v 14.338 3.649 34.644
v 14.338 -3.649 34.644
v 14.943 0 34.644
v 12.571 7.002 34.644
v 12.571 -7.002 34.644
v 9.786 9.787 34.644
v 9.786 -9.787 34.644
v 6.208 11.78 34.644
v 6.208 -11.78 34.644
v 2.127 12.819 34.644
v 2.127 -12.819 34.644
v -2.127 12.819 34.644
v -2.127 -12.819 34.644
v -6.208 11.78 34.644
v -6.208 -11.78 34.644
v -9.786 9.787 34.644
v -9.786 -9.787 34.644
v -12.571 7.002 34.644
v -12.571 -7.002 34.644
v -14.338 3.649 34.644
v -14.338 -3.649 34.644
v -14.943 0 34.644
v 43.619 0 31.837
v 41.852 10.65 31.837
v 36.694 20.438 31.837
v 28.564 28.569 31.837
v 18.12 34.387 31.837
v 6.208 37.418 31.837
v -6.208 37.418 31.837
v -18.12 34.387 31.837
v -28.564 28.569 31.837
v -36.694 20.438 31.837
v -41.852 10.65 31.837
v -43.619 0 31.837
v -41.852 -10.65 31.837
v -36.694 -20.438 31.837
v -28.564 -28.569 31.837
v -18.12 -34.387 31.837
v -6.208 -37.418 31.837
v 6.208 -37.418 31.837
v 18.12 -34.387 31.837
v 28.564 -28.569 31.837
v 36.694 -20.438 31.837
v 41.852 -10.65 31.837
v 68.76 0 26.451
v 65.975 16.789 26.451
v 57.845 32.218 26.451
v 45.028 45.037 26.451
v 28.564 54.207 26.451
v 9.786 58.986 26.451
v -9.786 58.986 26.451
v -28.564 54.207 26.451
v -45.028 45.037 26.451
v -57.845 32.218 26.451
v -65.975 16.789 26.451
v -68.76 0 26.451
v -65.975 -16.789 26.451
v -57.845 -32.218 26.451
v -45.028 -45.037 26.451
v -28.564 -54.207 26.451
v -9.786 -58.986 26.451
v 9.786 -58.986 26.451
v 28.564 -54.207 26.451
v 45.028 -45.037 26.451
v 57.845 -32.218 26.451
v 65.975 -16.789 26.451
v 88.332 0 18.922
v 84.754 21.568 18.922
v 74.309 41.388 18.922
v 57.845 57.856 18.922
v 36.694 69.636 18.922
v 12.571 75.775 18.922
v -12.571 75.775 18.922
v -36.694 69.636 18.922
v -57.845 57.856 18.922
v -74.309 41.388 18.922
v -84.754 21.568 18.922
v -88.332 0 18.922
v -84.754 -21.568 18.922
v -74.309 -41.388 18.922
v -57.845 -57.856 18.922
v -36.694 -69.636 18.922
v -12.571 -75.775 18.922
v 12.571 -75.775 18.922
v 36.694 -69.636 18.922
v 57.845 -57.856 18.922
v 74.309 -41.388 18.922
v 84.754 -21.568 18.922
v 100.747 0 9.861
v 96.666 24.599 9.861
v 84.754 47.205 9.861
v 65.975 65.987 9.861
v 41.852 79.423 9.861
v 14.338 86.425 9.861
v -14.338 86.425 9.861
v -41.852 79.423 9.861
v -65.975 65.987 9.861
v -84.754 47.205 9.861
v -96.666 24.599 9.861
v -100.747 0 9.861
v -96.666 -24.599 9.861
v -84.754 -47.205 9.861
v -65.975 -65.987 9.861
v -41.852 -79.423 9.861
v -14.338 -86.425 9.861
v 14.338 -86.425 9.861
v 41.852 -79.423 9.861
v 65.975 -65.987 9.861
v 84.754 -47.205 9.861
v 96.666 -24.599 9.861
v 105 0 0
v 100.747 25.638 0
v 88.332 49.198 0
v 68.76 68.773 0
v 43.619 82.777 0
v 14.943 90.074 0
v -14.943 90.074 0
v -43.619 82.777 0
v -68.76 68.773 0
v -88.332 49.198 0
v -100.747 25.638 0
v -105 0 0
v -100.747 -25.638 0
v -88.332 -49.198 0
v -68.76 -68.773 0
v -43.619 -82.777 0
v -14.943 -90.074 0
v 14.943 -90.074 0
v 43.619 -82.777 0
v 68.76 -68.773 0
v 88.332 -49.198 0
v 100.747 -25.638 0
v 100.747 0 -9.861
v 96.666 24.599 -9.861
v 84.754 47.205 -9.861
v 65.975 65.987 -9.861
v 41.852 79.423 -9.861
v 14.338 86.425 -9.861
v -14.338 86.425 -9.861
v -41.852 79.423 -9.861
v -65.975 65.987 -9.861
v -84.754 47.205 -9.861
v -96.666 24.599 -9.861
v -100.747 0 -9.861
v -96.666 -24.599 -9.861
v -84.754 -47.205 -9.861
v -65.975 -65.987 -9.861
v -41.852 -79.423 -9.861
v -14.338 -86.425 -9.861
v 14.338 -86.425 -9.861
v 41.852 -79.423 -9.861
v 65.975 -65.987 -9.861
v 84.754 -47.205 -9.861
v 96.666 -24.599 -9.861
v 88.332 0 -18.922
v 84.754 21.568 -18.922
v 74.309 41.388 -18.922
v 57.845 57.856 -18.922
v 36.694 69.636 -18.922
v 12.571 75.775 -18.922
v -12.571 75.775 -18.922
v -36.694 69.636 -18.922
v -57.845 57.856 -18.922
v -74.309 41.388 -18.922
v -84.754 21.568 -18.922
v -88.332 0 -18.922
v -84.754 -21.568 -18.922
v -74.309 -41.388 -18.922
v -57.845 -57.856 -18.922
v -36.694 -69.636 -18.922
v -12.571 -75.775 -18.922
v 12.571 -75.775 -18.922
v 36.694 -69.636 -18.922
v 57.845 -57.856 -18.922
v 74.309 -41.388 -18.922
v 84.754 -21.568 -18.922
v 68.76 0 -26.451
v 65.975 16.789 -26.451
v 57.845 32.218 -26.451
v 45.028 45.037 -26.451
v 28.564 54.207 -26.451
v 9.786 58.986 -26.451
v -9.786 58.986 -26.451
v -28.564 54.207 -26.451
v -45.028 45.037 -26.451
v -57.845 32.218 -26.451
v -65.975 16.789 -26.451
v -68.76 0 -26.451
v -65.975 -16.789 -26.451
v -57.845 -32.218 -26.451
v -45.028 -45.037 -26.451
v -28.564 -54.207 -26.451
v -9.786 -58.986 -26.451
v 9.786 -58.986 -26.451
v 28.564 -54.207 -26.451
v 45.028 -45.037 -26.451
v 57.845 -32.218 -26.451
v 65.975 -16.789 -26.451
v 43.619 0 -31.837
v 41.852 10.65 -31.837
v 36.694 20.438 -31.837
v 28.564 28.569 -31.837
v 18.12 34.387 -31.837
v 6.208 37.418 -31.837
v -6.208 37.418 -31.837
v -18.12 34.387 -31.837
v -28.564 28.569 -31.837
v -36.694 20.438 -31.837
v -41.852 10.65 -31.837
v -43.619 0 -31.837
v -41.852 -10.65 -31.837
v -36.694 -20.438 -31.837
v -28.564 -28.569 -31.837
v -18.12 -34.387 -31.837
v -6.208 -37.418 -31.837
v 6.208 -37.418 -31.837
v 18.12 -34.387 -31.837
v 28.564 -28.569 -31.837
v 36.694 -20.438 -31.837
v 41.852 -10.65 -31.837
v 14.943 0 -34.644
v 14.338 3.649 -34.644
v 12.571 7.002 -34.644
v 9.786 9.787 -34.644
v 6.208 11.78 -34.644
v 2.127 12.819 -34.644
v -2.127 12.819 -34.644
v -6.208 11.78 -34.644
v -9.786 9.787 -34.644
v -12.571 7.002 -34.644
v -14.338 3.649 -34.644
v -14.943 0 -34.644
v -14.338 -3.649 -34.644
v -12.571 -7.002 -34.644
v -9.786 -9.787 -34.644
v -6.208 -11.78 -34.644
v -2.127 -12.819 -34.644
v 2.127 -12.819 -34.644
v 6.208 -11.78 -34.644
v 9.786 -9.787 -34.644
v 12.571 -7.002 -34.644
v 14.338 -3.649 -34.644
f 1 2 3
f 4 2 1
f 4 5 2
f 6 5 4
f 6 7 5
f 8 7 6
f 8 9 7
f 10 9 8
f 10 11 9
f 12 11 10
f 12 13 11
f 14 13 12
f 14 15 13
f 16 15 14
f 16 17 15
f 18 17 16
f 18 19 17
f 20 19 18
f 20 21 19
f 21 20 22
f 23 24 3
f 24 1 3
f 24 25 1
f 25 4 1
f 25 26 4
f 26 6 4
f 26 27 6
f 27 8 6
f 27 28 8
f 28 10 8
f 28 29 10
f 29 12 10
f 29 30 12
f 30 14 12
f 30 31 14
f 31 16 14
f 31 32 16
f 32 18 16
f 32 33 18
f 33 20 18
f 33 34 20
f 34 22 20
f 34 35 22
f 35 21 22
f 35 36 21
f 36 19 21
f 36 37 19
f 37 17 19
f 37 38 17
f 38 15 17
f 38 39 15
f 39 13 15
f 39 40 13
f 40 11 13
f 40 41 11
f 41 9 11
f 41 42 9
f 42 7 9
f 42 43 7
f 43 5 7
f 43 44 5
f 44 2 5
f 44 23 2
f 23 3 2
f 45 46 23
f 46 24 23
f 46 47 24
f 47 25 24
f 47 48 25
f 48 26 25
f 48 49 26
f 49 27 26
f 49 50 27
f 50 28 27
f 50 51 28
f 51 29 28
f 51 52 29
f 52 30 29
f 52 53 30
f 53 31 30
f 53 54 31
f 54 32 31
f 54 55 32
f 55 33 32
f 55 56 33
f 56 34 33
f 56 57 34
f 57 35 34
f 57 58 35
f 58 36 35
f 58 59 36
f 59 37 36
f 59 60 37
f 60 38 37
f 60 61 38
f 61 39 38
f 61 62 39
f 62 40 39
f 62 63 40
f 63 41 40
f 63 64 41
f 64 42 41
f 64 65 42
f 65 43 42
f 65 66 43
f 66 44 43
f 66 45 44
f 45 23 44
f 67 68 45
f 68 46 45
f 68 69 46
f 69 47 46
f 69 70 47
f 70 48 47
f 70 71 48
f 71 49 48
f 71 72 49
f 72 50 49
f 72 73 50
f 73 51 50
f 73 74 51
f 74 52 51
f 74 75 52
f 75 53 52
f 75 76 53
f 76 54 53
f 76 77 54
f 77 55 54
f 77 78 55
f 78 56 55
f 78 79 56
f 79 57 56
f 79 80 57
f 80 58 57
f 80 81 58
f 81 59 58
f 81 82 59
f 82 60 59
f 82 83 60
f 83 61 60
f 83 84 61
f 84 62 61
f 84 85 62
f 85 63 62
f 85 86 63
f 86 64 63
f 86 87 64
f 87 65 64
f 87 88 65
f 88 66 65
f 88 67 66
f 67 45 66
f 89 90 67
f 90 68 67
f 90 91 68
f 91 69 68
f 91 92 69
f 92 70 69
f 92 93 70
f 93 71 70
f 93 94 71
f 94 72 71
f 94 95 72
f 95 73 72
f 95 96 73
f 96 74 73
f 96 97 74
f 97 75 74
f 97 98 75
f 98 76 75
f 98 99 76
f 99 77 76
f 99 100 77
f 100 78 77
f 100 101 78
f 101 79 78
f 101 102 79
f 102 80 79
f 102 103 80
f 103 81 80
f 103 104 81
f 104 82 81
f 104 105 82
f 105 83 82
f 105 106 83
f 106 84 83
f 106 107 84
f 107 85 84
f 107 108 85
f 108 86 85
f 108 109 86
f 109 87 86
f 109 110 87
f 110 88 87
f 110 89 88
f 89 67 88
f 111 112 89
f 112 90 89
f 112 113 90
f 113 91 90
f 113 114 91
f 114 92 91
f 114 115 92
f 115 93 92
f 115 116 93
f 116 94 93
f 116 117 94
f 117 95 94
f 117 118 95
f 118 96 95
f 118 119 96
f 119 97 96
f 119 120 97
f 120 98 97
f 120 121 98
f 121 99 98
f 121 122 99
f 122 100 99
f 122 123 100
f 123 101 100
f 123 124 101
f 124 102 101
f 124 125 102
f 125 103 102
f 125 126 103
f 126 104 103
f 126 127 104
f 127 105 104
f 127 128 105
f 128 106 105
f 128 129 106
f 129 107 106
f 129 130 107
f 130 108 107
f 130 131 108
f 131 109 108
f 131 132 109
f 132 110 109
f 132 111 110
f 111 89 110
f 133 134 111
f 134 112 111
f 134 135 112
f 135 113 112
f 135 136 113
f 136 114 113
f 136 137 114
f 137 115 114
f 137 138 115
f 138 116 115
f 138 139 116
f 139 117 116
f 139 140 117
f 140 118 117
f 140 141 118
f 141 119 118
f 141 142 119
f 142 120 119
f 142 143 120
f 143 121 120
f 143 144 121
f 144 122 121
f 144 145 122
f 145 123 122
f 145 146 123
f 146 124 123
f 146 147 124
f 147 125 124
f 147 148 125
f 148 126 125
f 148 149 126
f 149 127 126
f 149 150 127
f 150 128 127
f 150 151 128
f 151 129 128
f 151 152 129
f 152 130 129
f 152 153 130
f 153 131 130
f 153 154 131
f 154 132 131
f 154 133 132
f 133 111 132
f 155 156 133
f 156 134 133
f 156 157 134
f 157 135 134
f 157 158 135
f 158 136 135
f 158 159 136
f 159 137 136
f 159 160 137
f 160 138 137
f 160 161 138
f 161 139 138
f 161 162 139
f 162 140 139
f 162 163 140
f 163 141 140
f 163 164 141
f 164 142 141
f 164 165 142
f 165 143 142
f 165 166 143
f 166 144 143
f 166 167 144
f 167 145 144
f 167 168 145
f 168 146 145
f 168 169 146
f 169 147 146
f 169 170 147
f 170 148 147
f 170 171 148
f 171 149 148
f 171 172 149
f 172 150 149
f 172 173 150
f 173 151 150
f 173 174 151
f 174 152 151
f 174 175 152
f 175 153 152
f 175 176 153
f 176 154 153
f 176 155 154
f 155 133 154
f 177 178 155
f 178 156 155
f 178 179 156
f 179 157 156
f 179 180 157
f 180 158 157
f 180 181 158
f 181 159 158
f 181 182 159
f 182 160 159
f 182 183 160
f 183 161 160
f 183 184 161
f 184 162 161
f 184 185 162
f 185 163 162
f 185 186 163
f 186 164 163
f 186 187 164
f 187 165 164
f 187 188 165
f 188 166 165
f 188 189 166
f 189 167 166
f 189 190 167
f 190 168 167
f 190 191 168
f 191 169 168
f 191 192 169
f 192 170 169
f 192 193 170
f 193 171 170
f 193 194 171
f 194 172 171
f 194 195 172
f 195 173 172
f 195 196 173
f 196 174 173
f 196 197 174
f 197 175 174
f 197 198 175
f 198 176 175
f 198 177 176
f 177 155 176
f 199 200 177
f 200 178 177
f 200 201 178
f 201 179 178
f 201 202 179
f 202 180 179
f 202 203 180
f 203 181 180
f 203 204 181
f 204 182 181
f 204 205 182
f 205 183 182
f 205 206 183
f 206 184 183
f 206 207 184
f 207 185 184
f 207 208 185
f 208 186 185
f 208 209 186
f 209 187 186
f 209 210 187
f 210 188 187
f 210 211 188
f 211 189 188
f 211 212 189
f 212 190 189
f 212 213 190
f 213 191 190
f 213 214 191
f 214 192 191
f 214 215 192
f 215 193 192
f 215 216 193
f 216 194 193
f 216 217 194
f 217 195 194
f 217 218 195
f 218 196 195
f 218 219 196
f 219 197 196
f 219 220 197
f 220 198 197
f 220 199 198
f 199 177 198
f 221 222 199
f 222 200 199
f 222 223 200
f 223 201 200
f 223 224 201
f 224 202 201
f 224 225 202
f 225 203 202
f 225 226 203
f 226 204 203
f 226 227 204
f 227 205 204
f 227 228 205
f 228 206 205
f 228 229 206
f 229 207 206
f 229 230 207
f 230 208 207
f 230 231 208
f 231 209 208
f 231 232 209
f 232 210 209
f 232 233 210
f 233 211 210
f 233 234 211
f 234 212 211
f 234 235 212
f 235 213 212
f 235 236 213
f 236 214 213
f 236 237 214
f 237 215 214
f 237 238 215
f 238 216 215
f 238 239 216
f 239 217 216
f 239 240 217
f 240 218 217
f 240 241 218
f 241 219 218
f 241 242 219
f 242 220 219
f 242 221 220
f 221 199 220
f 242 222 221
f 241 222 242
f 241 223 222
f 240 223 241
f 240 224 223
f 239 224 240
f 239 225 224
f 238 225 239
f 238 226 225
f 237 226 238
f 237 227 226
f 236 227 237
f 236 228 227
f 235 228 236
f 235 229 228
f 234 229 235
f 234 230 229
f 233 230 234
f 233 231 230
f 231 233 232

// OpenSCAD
// Generated by SolidPython 1.0.1 on 2020-07-29 00:46:52


scale(v = [15, 13, 5]) {
	sphere(r = 7);
}
/***********************************************
*********      SolidPython code:      **********
************************************************
 
# import packages: SolidPython
from solid import *
from solid.utils import *
from itertools import chain, combinations, permutations


class Resize:

    def __init__(self, scad_file):
        self.scad_file = scad_file
        #self.scad_file = import_scad(scad_file)
        # cone/cylinder param:
        self.r1 = 0
        self.r2 = 0
        self.h = 0
        # rectangular prism param:
        self.w = 0
        self.l = 0
        # ellipse param:
        self.r = 0

    # import OpenScad code (file name corresponds to shape)


    # classify shape + parameters
    def assign(self, param1, param2, param3):
        if self.scad_file == 'cone.scad':
            self.r1 = param1
            self.r2 = param2
            self.h = param3
        elif self.scad_file == 'cylinder.scad':
            self.r1 = param1
            self.r2 = param2
            self.h = param3
        elif self.scad_file == 'rectangularPrism.scad':
            self.h = param1
            self.l = param2
            self.w = param3
        else:
            self.r = param1
            self.h = param2

    # resize parameters
    def iterate(self):
        x = range(3, 20, 2)
        i = 1
        if self.scad_file == 'cone.scad':
            tempList = list(permutations(x, 2))
            for temp in tempList:
                param1 = temp[0]
                param2 = temp[1]
                filepath = 'produced_scad_files/' + 'cone' + str(param1) + '_' + str(param2) + '_' + '.scad'
                scad_render_to_file(cylinder(h=param1, r1=param2, r2=0), filepath)

        elif self.scad_file == 'cylinder.scad':
            tempList = list(permutations(x, 3))
            for temp in tempList:
                param1 = temp[0]
                param2 = temp[1]
                filepath = 'produced_scad_files/' + 'cylinder' + str(param1) + '_' + str(param2) + '_' + '.scad'
                scad_render_to_file(cylinder(h=param1, r1=param2, r2=param2), filepath)

        elif self.scad_file == 'rectangularPrism.scad':
            tempList = list(permutations(x, 3))
            for temp in tempList:
                param1 = temp[0]
                param2 = temp[1]
                param3 = temp[2]
                filepath = 'produced_scad_files/' + 'rectangularPrism' + str(param1) + '_' + str(param2) + '_' + str(
                    param3) + '.scad'
                scad_render_to_file(cube(size=(param1, param2, param3)), filepath)

        elif self.scad_file == 'ellipse.scad':
            tempList = list(permutations(x, 4))
            for temp in tempList:
                param1 = temp[0]
                param2 = temp[1]
                param3 = temp[2]
                param4 = temp[3]
                filepath = 'produced_scad_files/' + 'ellipse' + str(param1) + '_' + str(param2) + '_' + str(param3) + '_' + str(param4) + '.scad'
                scad_render_to_file(scale([param1, param2, param3])(sphere(r=param4)), filepath)

    def render_to_scadfile(self):
        scad_render_to_file(scad, 'example.scad') 
 
************************************************/
